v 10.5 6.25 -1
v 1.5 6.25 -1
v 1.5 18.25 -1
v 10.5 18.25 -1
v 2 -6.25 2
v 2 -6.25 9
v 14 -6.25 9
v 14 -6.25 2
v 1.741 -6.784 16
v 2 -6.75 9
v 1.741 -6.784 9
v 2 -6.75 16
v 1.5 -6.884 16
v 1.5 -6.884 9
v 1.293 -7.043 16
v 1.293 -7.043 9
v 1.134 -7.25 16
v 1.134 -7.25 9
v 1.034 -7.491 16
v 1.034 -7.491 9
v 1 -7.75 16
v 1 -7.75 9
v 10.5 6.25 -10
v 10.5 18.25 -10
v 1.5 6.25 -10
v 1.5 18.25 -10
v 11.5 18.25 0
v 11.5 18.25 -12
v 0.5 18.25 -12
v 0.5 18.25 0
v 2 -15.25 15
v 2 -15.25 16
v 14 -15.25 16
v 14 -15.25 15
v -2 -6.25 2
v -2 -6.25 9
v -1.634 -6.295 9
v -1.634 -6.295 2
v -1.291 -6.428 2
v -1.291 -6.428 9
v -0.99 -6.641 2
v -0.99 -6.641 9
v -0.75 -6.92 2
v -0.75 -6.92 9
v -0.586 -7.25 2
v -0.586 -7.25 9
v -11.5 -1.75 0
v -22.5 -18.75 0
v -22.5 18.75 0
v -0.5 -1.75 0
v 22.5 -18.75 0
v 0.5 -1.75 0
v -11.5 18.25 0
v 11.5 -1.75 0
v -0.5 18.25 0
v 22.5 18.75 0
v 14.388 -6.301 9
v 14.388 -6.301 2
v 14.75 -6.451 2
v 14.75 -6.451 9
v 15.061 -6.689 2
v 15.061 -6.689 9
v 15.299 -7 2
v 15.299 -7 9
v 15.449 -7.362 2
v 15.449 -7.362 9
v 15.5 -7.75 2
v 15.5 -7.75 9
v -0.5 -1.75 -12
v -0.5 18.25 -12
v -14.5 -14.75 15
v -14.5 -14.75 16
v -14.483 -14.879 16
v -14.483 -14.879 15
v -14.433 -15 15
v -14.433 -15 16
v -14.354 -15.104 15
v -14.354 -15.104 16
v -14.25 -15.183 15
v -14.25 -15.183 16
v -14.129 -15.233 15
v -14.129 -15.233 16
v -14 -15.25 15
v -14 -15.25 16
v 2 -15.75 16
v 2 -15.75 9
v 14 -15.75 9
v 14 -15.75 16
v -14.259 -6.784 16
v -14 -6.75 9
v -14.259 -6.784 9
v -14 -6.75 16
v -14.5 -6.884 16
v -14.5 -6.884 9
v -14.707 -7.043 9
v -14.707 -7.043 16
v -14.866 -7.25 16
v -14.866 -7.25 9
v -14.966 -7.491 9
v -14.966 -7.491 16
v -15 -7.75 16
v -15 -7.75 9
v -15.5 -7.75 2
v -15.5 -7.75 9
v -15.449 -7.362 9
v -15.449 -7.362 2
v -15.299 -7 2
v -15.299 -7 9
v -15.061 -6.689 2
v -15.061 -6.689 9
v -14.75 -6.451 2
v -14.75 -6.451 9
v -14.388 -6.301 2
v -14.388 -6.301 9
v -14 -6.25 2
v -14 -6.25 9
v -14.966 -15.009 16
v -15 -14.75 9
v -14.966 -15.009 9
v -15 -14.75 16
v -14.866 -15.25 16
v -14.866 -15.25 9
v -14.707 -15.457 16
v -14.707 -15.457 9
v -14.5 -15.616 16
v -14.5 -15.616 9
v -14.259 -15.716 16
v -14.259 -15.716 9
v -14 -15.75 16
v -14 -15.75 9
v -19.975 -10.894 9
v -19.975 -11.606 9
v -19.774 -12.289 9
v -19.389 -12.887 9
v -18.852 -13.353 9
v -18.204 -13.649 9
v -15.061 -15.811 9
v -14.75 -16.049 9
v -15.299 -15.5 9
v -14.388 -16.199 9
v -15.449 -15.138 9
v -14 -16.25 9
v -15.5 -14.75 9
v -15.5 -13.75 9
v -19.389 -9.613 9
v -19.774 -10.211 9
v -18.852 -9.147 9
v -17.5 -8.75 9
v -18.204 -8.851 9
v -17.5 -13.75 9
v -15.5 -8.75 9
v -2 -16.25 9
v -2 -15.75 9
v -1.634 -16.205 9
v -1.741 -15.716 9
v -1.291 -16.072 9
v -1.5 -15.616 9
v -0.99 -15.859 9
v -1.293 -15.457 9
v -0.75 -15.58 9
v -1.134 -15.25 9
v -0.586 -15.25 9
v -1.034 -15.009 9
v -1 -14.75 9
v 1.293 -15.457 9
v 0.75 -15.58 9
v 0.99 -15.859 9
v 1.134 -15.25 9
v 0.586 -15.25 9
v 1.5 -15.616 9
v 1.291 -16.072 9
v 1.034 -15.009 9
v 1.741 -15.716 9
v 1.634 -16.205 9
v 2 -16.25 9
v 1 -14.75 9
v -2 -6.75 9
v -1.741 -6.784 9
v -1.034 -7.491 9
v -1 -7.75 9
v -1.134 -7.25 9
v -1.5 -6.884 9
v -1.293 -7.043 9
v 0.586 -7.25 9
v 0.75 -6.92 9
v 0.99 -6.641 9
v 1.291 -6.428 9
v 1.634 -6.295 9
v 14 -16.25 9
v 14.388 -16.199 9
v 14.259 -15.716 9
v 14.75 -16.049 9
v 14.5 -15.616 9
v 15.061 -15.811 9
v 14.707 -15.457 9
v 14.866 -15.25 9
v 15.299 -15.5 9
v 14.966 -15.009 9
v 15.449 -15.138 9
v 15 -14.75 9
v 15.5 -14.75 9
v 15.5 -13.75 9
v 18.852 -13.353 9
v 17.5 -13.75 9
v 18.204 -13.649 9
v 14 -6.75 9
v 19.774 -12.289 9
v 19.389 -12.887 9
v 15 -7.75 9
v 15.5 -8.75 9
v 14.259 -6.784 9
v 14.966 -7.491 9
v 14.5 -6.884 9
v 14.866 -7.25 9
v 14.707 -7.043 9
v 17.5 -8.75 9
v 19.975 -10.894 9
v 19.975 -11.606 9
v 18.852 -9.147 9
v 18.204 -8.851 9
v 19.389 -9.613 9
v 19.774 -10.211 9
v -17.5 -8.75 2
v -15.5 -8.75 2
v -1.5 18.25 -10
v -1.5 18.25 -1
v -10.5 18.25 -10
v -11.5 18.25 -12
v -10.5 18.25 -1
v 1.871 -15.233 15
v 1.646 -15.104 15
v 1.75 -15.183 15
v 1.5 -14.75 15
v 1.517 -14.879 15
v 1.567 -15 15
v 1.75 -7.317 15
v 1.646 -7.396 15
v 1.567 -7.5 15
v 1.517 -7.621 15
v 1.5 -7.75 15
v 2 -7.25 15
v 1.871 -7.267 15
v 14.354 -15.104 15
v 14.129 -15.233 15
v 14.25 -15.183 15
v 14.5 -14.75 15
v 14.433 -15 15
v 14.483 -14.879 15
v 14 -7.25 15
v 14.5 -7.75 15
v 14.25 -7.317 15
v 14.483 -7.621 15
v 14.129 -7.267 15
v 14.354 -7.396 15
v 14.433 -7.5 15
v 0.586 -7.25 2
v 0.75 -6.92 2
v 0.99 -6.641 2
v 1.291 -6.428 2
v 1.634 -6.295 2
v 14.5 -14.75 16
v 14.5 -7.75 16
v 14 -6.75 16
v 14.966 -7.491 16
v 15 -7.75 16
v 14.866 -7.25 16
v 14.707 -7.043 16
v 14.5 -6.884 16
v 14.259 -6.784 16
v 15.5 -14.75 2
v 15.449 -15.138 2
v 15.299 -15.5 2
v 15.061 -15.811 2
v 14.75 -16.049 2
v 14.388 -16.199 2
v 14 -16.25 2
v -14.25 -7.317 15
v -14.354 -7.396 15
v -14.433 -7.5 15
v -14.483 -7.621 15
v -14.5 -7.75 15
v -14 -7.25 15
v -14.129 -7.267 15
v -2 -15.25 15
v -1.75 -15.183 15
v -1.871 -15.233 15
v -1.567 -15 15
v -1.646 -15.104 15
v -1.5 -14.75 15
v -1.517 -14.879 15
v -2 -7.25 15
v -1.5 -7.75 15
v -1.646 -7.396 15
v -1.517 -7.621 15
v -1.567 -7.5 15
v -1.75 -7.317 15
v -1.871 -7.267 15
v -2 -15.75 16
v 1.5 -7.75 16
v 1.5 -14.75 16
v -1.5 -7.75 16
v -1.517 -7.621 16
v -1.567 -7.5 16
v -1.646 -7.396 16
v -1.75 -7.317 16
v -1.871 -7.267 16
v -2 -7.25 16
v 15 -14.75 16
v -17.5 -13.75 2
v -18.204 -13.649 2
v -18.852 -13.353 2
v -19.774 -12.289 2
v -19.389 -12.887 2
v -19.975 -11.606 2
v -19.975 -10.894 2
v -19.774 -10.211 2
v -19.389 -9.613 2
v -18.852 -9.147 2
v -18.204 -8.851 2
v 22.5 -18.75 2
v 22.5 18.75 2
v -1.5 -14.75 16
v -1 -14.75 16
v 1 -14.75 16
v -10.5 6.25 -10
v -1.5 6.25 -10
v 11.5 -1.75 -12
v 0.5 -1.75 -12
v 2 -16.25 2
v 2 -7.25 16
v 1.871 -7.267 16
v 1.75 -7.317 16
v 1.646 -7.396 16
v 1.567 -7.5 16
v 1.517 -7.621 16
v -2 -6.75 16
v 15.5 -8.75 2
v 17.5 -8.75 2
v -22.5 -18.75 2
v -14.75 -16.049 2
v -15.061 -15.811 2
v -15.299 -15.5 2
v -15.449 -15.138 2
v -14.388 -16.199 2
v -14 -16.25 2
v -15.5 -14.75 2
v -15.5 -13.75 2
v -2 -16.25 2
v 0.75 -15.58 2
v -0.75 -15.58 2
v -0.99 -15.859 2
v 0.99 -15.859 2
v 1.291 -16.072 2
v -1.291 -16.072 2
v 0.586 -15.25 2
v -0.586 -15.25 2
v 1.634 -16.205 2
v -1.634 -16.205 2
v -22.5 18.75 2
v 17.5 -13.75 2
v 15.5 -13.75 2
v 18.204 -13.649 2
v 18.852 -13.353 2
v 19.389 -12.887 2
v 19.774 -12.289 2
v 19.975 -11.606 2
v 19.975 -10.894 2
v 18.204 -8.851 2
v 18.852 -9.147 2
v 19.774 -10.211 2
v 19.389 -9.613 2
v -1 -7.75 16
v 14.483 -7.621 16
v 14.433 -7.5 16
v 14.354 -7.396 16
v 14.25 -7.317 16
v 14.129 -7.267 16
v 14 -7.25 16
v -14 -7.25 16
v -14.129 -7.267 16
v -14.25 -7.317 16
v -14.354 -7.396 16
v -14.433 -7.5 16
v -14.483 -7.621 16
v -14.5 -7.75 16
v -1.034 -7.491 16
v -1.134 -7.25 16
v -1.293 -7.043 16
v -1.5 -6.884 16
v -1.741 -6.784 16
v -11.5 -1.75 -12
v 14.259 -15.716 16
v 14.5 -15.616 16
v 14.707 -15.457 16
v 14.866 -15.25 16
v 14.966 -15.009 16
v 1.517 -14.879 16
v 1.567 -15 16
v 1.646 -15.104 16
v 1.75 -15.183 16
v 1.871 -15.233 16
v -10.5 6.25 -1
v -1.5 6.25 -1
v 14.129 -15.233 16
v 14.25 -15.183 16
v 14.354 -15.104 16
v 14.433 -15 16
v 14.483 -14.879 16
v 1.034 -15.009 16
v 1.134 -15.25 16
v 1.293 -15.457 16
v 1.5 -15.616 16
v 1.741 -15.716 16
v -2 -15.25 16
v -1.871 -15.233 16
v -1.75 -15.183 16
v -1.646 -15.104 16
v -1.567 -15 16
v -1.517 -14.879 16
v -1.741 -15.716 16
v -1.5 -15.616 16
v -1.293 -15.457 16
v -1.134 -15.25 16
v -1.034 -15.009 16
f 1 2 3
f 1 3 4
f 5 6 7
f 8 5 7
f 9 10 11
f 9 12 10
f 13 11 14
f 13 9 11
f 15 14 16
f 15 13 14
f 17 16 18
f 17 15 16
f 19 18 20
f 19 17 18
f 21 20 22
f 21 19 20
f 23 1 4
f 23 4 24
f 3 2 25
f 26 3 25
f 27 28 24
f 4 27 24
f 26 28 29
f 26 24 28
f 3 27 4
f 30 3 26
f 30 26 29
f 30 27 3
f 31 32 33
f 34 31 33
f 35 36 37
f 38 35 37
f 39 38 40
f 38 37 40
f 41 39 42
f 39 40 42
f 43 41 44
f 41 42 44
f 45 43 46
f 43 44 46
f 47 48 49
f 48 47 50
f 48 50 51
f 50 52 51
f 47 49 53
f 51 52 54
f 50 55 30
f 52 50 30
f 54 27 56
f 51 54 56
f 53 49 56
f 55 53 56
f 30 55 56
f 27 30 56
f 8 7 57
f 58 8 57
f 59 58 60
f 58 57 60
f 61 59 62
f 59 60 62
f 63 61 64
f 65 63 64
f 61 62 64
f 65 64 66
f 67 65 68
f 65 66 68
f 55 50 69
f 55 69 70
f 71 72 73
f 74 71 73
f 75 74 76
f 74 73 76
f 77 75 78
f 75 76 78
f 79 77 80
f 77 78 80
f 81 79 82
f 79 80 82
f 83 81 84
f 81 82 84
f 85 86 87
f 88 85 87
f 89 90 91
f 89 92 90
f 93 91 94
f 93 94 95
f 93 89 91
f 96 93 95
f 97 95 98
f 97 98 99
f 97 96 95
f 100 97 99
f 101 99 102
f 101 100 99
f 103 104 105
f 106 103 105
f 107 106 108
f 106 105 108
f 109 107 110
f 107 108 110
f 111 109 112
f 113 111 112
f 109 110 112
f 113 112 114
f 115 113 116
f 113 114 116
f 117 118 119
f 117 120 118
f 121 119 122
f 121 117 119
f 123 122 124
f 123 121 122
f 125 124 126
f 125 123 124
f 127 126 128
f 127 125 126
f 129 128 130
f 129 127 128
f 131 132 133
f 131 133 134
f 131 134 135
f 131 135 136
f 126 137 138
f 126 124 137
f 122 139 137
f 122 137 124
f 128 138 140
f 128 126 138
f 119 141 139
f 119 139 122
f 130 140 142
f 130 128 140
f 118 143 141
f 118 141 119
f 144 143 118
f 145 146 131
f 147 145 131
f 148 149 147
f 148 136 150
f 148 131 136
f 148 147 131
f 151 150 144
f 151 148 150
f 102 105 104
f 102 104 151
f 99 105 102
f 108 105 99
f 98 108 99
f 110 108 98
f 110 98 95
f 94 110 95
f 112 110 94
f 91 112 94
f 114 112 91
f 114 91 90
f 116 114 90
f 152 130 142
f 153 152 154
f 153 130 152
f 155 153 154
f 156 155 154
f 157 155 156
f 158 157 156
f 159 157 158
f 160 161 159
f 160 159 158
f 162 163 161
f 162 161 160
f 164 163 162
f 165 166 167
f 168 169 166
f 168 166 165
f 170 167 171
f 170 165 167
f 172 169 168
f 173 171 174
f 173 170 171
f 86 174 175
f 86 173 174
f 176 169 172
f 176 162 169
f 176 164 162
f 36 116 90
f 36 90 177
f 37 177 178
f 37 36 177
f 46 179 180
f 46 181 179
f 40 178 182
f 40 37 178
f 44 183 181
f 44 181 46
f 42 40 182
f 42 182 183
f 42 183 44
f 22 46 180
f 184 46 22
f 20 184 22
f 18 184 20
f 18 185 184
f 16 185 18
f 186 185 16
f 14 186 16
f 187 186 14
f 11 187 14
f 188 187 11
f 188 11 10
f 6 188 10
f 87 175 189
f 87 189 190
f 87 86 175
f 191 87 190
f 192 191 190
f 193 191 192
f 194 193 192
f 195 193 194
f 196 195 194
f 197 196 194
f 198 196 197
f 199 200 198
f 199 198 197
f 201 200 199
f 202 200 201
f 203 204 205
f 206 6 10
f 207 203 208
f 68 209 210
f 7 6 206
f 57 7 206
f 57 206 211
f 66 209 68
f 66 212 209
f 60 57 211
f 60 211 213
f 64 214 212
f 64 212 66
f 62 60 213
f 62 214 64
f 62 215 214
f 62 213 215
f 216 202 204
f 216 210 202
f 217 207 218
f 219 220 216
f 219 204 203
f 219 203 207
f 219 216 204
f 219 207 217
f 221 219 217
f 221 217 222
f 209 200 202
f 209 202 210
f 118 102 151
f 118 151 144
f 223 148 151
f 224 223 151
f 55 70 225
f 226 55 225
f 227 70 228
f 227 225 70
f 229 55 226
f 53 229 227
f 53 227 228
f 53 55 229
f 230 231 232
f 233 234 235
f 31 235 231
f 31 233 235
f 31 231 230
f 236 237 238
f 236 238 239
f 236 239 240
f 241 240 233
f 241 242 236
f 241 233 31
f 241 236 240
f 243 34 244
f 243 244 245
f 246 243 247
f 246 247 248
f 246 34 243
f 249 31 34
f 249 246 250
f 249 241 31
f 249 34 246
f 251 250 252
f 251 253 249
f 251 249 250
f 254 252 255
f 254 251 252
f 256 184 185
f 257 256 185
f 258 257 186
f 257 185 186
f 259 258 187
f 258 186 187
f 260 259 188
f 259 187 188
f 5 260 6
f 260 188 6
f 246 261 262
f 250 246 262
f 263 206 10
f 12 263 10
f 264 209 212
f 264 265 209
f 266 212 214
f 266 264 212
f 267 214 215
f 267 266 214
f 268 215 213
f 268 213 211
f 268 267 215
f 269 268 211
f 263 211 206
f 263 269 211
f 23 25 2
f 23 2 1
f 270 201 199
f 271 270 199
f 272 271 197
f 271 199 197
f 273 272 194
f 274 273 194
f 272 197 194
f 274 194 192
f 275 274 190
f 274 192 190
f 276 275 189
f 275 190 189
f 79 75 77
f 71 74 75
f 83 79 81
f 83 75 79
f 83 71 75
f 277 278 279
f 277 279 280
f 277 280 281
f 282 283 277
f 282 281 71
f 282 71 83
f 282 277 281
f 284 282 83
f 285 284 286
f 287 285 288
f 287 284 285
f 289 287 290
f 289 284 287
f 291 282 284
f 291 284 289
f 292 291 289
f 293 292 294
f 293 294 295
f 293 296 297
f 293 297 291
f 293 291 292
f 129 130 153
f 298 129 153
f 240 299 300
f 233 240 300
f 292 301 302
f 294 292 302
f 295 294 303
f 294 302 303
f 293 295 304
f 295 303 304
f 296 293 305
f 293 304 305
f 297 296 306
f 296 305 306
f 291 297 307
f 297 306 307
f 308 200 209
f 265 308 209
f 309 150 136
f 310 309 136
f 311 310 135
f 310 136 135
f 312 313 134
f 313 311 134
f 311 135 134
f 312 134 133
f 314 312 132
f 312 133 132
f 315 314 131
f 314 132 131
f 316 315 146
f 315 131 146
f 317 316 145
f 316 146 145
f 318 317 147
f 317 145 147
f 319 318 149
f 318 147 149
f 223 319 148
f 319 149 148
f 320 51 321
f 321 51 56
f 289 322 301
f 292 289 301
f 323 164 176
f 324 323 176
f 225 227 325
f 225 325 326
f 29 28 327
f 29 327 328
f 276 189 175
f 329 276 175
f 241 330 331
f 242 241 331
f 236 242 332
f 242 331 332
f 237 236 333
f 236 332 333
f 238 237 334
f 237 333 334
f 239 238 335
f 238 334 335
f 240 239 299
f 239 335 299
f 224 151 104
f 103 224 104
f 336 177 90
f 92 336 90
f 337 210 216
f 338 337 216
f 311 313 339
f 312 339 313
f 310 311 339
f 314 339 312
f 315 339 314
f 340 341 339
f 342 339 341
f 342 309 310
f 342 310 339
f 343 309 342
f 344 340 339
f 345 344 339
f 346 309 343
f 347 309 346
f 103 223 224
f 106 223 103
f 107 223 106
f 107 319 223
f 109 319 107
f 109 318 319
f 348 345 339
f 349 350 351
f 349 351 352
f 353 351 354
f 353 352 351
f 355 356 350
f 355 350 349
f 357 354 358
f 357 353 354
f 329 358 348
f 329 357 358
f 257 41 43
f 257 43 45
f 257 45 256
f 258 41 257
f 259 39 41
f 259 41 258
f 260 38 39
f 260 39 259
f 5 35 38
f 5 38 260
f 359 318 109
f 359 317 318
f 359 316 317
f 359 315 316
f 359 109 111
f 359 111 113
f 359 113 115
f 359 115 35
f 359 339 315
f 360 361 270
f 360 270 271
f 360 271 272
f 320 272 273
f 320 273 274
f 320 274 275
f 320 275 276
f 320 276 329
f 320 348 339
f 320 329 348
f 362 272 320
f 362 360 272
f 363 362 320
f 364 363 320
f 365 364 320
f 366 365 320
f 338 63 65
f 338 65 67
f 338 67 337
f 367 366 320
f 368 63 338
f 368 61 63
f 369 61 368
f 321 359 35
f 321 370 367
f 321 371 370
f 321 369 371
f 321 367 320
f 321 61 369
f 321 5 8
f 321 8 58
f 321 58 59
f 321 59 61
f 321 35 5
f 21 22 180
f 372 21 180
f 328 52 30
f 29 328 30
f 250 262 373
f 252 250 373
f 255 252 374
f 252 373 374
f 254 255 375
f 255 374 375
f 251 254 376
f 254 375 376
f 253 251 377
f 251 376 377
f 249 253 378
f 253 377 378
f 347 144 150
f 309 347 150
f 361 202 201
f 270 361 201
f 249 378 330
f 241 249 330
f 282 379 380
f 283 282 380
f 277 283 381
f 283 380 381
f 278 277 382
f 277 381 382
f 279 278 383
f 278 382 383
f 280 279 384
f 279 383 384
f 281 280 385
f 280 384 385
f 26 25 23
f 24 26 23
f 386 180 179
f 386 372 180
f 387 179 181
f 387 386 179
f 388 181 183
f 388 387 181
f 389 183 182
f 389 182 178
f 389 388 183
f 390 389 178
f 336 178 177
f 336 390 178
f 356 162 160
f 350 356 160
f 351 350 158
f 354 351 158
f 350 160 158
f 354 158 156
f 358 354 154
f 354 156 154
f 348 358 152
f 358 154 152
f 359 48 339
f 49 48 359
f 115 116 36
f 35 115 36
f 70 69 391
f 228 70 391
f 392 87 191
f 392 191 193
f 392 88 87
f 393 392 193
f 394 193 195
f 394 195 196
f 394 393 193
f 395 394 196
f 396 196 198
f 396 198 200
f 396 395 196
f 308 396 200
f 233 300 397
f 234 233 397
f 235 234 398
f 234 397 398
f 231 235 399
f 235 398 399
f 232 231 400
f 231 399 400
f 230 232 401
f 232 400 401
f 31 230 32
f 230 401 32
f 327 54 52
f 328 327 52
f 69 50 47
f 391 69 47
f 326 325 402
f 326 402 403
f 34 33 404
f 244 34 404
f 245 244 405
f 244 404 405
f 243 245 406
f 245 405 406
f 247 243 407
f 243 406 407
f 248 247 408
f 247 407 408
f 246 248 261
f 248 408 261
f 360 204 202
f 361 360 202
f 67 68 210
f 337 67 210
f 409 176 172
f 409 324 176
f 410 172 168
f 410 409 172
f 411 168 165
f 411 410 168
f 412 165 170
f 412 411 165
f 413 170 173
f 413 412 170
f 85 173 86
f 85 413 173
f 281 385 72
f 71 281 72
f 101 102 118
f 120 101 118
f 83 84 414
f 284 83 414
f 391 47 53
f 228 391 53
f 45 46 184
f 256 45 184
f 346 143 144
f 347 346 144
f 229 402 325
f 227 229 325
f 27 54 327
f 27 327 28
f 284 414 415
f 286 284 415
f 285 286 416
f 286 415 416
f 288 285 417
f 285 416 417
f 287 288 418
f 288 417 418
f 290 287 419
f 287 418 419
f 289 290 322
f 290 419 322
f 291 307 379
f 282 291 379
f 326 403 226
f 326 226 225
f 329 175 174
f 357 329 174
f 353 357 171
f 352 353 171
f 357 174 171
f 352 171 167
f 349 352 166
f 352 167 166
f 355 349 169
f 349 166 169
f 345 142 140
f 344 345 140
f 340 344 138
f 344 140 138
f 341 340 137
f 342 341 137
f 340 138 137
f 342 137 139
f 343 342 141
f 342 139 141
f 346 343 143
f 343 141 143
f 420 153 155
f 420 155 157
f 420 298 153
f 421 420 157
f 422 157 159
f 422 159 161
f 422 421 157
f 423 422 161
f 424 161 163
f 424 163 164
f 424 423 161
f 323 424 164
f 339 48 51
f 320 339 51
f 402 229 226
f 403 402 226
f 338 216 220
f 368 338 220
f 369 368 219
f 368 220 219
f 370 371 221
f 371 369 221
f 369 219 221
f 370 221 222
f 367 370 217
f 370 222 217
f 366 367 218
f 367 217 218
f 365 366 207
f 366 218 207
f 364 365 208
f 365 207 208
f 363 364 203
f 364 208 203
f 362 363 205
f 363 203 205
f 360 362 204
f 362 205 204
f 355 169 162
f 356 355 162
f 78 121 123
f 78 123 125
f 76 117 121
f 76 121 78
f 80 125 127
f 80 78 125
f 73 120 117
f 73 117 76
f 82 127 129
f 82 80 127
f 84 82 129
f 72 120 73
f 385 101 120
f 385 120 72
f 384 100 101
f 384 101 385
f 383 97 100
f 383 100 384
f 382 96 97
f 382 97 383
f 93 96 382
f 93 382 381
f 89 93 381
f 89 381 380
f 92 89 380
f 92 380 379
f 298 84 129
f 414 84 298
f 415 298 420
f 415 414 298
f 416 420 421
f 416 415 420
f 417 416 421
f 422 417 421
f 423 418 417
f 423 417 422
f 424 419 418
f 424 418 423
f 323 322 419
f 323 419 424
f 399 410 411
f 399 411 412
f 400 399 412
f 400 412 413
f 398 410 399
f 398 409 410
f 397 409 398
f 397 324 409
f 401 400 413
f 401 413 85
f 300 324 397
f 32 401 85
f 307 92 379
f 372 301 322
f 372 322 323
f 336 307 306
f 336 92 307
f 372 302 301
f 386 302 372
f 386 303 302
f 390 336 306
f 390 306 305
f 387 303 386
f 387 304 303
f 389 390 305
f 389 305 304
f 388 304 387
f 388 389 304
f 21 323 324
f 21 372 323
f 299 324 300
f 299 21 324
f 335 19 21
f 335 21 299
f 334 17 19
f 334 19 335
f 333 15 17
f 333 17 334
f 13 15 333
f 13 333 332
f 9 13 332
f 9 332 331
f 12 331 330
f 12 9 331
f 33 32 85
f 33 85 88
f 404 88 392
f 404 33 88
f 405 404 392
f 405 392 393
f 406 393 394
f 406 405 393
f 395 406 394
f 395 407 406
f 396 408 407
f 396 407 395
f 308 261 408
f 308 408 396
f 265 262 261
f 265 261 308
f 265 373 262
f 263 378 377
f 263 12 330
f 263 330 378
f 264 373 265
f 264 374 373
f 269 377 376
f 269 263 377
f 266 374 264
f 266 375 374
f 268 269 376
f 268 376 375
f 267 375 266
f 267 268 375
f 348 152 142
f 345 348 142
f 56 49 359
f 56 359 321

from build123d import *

# Parameters (mm, degrees)
SKETCH1_W           = 45
SKETCH1_H           = 37.5
BOSS_EXTRUDE1_DEPTH = 2
SKETCH2_W           = 40
SKETCH2_H           = 13
BOSS_EXTRUDE2_DEPTH = 7
BOSS_EXTRUDE3_DEPTH = 7
FILLET1_R           = 1
CUT_EXTRUDE1_DEPTH  = 1
SKETCH5_W           = 41
SKETCH5_H           = 14
CUT_EXTRUDE2_DEPTH  = 7
SKETCH6_W           = 11
SKETCH6_H           = 20
BOSS_EXTRUDE5_DEPTH = 12
SKETCH7_W           = 9
SKETCH7_H           = 9
CUT_EXTRUDE3_DEPTH  = 12


with BuildPart() as part:
    # Sketch1 → Boss-Extrude1 (new body)
    with BuildSketch(Plane.XY):
        Rectangle(SKETCH1_W, SKETCH1_H)
    extrude(amount=BOSS_EXTRUDE1_DEPTH)

    # Sketch2 → Boss-Extrude2 (add)
    with BuildSketch(Plane.XY.offset(2)):
        with Locations((0, -11.25)):
            Rectangle(SKETCH2_W, SKETCH2_H)
    extrude(amount=BOSS_EXTRUDE2_DEPTH)

    # Sketch3 → Boss-Extrude3 (add)
    with BuildSketch(Plane.XY.offset(9)):
        Polygon((-1, -7.75), (-1, -6.75), (-15, -6.75), (-15, -15.75), (-1, -15.75), (-1, -14.75), (1, -14.75), (1, -15.75), (15, -15.75), (15, -6.75), (1, -6.75), (1, -7.75), align=None)
    extrude(amount=BOSS_EXTRUDE3_DEPTH)

    # Fillet1
    fillet1_edges = [part.edges().sort_by_distance(p)[0] for p in [
        (-15, -15.75, 12.5),
        (-1, -15.75, 12.5),
        (1, -15.75, 12.5),
        (-15, -6.75, 12.5),
        (15, -15.75, 12.5),
        (15, -6.75, 12.5),
        (1, -6.75, 12.5),
        (-1, -6.75, 12.5),
    ]]
    fillet(fillet1_edges, radius=FILLET1_R - 0.0001)  # a hair under: the kernel refuses the full size

    # Sketch4 → Cut-Extrude1 (cut)
    with BuildSketch(Plane.XY.offset(16)):
        with BuildLine():
            Line((-1.5, -14.75), (-1.5, -7.75))
            ThreePointArc((-1.5, -7.75), (-1.646446609, -7.396446609), (-2, -7.25))
            Line((-2, -7.25), (-14, -7.25))
            ThreePointArc((-14, -7.25), (-14.353553391, -7.396446609), (-14.5, -7.75))
            Line((-14.5, -7.75), (-14.5, -14.75))
            ThreePointArc((-14.5, -14.75), (-14.353553391, -15.103553391), (-14, -15.25))
            Line((-14, -15.25), (-2, -15.25))
            ThreePointArc((-2, -15.25), (-1.646446609, -15.103553391), (-1.5, -14.75))
        make_face()
        with BuildLine():
            Line((1.5, -7.75), (1.5, -14.75))
            ThreePointArc((1.5, -14.75), (1.646446609, -15.103553391), (2, -15.25))
            Line((2, -15.25), (14, -15.25))
            ThreePointArc((14, -15.25), (14.353553391, -15.103553391), (14.5, -14.75))
            Line((14.5, -14.75), (14.5, -7.75))
            ThreePointArc((14.5, -7.75), (14.353553391, -7.396446609), (14, -7.25))
            Line((14, -7.25), (2, -7.25))
            ThreePointArc((2, -7.25), (1.646446609, -7.396446609), (1.5, -7.75))
        make_face()
    extrude(amount=-CUT_EXTRUDE1_DEPTH, mode=Mode.SUBTRACT)

    # Sketch5 → Cut-Extrude2 (cut)
    with BuildSketch(Plane.XY.offset(9)):
        with Locations((0, -11.25)):
            Rectangle(SKETCH5_W, SKETCH5_H)
        with BuildLine():
            Line((-17.5, -8.75), (-15.5, -8.75))
            Line((-15.5, -8.75), (-15.5, -7.75))
            ThreePointArc((-15.5, -7.75), (-15.060660172, -6.689339828), (-14, -6.25))
            Line((-14, -6.25), (-2, -6.25))
            ThreePointArc((-2, -6.25), (-1.133974596, -6.525255129), (-0.585786438, -7.25))
            Line((-0.585786438, -7.25), (0.585786438, -7.25))
            ThreePointArc((0.585786438, -7.25), (1.133974596, -6.525255129), (2, -6.25))
            Line((2, -6.25), (14, -6.25))
            ThreePointArc((14, -6.25), (15.060660172, -6.689339828), (15.5, -7.75))
            Line((15.5, -7.75), (15.5, -8.75))
            Line((15.5, -8.75), (17.5, -8.75))
            ThreePointArc((17.5, -8.75), (20, -11.25), (17.5, -13.75))
            Line((17.5, -13.75), (15.5, -13.75))
            Line((15.5, -13.75), (15.5, -14.75))
            ThreePointArc((15.5, -14.75), (15.060660172, -15.810660172), (14, -16.25))
            Line((14, -16.25), (2, -16.25))
            ThreePointArc((2, -16.25), (1.133974596, -15.974744871), (0.585786438, -15.25))
            Line((0.585786438, -15.25), (-0.585786438, -15.25))
            ThreePointArc((-0.585786438, -15.25), (-1.133974596, -15.974744871), (-2, -16.25))
            Line((-2, -16.25), (-14, -16.25))
            ThreePointArc((-14, -16.25), (-15.060660172, -15.810660172), (-15.5, -14.75))
            Line((-15.5, -14.75), (-15.5, -13.75))
            Line((-15.5, -13.75), (-17.5, -13.75))
            ThreePointArc((-17.5, -13.75), (-20, -11.25), (-17.5, -8.75))
        make_face(mode=Mode.SUBTRACT)
    extrude(amount=-CUT_EXTRUDE2_DEPTH, mode=Mode.SUBTRACT)

    # Sketch6 → Boss-Extrude5 (add)
    with BuildSketch(Plane(origin=(0, 0, 0), x_dir=(-1, 0, 0), z_dir=(0, 0, -1))):
        with Locations((-6, 8.25)):
            Rectangle(SKETCH6_W, SKETCH6_H)
        with Locations((6, 8.25)):
            Rectangle(SKETCH6_W, SKETCH6_H)
    extrude(amount=BOSS_EXTRUDE5_DEPTH)

    # Sketch7 → Cut-Extrude3 (cut)
    with BuildSketch(Plane(origin=(0, 18.25, 0), x_dir=(1, 0, 0), z_dir=(0, 1, 0))):
        with Locations((-6, 5.5)):
            Rectangle(SKETCH7_W, SKETCH7_H)
        with Locations((6, 5.5)):
            Rectangle(SKETCH7_W, SKETCH7_H)
    extrude(amount=-CUT_EXTRUDE3_DEPTH, mode=Mode.SUBTRACT)


solid = part.part
